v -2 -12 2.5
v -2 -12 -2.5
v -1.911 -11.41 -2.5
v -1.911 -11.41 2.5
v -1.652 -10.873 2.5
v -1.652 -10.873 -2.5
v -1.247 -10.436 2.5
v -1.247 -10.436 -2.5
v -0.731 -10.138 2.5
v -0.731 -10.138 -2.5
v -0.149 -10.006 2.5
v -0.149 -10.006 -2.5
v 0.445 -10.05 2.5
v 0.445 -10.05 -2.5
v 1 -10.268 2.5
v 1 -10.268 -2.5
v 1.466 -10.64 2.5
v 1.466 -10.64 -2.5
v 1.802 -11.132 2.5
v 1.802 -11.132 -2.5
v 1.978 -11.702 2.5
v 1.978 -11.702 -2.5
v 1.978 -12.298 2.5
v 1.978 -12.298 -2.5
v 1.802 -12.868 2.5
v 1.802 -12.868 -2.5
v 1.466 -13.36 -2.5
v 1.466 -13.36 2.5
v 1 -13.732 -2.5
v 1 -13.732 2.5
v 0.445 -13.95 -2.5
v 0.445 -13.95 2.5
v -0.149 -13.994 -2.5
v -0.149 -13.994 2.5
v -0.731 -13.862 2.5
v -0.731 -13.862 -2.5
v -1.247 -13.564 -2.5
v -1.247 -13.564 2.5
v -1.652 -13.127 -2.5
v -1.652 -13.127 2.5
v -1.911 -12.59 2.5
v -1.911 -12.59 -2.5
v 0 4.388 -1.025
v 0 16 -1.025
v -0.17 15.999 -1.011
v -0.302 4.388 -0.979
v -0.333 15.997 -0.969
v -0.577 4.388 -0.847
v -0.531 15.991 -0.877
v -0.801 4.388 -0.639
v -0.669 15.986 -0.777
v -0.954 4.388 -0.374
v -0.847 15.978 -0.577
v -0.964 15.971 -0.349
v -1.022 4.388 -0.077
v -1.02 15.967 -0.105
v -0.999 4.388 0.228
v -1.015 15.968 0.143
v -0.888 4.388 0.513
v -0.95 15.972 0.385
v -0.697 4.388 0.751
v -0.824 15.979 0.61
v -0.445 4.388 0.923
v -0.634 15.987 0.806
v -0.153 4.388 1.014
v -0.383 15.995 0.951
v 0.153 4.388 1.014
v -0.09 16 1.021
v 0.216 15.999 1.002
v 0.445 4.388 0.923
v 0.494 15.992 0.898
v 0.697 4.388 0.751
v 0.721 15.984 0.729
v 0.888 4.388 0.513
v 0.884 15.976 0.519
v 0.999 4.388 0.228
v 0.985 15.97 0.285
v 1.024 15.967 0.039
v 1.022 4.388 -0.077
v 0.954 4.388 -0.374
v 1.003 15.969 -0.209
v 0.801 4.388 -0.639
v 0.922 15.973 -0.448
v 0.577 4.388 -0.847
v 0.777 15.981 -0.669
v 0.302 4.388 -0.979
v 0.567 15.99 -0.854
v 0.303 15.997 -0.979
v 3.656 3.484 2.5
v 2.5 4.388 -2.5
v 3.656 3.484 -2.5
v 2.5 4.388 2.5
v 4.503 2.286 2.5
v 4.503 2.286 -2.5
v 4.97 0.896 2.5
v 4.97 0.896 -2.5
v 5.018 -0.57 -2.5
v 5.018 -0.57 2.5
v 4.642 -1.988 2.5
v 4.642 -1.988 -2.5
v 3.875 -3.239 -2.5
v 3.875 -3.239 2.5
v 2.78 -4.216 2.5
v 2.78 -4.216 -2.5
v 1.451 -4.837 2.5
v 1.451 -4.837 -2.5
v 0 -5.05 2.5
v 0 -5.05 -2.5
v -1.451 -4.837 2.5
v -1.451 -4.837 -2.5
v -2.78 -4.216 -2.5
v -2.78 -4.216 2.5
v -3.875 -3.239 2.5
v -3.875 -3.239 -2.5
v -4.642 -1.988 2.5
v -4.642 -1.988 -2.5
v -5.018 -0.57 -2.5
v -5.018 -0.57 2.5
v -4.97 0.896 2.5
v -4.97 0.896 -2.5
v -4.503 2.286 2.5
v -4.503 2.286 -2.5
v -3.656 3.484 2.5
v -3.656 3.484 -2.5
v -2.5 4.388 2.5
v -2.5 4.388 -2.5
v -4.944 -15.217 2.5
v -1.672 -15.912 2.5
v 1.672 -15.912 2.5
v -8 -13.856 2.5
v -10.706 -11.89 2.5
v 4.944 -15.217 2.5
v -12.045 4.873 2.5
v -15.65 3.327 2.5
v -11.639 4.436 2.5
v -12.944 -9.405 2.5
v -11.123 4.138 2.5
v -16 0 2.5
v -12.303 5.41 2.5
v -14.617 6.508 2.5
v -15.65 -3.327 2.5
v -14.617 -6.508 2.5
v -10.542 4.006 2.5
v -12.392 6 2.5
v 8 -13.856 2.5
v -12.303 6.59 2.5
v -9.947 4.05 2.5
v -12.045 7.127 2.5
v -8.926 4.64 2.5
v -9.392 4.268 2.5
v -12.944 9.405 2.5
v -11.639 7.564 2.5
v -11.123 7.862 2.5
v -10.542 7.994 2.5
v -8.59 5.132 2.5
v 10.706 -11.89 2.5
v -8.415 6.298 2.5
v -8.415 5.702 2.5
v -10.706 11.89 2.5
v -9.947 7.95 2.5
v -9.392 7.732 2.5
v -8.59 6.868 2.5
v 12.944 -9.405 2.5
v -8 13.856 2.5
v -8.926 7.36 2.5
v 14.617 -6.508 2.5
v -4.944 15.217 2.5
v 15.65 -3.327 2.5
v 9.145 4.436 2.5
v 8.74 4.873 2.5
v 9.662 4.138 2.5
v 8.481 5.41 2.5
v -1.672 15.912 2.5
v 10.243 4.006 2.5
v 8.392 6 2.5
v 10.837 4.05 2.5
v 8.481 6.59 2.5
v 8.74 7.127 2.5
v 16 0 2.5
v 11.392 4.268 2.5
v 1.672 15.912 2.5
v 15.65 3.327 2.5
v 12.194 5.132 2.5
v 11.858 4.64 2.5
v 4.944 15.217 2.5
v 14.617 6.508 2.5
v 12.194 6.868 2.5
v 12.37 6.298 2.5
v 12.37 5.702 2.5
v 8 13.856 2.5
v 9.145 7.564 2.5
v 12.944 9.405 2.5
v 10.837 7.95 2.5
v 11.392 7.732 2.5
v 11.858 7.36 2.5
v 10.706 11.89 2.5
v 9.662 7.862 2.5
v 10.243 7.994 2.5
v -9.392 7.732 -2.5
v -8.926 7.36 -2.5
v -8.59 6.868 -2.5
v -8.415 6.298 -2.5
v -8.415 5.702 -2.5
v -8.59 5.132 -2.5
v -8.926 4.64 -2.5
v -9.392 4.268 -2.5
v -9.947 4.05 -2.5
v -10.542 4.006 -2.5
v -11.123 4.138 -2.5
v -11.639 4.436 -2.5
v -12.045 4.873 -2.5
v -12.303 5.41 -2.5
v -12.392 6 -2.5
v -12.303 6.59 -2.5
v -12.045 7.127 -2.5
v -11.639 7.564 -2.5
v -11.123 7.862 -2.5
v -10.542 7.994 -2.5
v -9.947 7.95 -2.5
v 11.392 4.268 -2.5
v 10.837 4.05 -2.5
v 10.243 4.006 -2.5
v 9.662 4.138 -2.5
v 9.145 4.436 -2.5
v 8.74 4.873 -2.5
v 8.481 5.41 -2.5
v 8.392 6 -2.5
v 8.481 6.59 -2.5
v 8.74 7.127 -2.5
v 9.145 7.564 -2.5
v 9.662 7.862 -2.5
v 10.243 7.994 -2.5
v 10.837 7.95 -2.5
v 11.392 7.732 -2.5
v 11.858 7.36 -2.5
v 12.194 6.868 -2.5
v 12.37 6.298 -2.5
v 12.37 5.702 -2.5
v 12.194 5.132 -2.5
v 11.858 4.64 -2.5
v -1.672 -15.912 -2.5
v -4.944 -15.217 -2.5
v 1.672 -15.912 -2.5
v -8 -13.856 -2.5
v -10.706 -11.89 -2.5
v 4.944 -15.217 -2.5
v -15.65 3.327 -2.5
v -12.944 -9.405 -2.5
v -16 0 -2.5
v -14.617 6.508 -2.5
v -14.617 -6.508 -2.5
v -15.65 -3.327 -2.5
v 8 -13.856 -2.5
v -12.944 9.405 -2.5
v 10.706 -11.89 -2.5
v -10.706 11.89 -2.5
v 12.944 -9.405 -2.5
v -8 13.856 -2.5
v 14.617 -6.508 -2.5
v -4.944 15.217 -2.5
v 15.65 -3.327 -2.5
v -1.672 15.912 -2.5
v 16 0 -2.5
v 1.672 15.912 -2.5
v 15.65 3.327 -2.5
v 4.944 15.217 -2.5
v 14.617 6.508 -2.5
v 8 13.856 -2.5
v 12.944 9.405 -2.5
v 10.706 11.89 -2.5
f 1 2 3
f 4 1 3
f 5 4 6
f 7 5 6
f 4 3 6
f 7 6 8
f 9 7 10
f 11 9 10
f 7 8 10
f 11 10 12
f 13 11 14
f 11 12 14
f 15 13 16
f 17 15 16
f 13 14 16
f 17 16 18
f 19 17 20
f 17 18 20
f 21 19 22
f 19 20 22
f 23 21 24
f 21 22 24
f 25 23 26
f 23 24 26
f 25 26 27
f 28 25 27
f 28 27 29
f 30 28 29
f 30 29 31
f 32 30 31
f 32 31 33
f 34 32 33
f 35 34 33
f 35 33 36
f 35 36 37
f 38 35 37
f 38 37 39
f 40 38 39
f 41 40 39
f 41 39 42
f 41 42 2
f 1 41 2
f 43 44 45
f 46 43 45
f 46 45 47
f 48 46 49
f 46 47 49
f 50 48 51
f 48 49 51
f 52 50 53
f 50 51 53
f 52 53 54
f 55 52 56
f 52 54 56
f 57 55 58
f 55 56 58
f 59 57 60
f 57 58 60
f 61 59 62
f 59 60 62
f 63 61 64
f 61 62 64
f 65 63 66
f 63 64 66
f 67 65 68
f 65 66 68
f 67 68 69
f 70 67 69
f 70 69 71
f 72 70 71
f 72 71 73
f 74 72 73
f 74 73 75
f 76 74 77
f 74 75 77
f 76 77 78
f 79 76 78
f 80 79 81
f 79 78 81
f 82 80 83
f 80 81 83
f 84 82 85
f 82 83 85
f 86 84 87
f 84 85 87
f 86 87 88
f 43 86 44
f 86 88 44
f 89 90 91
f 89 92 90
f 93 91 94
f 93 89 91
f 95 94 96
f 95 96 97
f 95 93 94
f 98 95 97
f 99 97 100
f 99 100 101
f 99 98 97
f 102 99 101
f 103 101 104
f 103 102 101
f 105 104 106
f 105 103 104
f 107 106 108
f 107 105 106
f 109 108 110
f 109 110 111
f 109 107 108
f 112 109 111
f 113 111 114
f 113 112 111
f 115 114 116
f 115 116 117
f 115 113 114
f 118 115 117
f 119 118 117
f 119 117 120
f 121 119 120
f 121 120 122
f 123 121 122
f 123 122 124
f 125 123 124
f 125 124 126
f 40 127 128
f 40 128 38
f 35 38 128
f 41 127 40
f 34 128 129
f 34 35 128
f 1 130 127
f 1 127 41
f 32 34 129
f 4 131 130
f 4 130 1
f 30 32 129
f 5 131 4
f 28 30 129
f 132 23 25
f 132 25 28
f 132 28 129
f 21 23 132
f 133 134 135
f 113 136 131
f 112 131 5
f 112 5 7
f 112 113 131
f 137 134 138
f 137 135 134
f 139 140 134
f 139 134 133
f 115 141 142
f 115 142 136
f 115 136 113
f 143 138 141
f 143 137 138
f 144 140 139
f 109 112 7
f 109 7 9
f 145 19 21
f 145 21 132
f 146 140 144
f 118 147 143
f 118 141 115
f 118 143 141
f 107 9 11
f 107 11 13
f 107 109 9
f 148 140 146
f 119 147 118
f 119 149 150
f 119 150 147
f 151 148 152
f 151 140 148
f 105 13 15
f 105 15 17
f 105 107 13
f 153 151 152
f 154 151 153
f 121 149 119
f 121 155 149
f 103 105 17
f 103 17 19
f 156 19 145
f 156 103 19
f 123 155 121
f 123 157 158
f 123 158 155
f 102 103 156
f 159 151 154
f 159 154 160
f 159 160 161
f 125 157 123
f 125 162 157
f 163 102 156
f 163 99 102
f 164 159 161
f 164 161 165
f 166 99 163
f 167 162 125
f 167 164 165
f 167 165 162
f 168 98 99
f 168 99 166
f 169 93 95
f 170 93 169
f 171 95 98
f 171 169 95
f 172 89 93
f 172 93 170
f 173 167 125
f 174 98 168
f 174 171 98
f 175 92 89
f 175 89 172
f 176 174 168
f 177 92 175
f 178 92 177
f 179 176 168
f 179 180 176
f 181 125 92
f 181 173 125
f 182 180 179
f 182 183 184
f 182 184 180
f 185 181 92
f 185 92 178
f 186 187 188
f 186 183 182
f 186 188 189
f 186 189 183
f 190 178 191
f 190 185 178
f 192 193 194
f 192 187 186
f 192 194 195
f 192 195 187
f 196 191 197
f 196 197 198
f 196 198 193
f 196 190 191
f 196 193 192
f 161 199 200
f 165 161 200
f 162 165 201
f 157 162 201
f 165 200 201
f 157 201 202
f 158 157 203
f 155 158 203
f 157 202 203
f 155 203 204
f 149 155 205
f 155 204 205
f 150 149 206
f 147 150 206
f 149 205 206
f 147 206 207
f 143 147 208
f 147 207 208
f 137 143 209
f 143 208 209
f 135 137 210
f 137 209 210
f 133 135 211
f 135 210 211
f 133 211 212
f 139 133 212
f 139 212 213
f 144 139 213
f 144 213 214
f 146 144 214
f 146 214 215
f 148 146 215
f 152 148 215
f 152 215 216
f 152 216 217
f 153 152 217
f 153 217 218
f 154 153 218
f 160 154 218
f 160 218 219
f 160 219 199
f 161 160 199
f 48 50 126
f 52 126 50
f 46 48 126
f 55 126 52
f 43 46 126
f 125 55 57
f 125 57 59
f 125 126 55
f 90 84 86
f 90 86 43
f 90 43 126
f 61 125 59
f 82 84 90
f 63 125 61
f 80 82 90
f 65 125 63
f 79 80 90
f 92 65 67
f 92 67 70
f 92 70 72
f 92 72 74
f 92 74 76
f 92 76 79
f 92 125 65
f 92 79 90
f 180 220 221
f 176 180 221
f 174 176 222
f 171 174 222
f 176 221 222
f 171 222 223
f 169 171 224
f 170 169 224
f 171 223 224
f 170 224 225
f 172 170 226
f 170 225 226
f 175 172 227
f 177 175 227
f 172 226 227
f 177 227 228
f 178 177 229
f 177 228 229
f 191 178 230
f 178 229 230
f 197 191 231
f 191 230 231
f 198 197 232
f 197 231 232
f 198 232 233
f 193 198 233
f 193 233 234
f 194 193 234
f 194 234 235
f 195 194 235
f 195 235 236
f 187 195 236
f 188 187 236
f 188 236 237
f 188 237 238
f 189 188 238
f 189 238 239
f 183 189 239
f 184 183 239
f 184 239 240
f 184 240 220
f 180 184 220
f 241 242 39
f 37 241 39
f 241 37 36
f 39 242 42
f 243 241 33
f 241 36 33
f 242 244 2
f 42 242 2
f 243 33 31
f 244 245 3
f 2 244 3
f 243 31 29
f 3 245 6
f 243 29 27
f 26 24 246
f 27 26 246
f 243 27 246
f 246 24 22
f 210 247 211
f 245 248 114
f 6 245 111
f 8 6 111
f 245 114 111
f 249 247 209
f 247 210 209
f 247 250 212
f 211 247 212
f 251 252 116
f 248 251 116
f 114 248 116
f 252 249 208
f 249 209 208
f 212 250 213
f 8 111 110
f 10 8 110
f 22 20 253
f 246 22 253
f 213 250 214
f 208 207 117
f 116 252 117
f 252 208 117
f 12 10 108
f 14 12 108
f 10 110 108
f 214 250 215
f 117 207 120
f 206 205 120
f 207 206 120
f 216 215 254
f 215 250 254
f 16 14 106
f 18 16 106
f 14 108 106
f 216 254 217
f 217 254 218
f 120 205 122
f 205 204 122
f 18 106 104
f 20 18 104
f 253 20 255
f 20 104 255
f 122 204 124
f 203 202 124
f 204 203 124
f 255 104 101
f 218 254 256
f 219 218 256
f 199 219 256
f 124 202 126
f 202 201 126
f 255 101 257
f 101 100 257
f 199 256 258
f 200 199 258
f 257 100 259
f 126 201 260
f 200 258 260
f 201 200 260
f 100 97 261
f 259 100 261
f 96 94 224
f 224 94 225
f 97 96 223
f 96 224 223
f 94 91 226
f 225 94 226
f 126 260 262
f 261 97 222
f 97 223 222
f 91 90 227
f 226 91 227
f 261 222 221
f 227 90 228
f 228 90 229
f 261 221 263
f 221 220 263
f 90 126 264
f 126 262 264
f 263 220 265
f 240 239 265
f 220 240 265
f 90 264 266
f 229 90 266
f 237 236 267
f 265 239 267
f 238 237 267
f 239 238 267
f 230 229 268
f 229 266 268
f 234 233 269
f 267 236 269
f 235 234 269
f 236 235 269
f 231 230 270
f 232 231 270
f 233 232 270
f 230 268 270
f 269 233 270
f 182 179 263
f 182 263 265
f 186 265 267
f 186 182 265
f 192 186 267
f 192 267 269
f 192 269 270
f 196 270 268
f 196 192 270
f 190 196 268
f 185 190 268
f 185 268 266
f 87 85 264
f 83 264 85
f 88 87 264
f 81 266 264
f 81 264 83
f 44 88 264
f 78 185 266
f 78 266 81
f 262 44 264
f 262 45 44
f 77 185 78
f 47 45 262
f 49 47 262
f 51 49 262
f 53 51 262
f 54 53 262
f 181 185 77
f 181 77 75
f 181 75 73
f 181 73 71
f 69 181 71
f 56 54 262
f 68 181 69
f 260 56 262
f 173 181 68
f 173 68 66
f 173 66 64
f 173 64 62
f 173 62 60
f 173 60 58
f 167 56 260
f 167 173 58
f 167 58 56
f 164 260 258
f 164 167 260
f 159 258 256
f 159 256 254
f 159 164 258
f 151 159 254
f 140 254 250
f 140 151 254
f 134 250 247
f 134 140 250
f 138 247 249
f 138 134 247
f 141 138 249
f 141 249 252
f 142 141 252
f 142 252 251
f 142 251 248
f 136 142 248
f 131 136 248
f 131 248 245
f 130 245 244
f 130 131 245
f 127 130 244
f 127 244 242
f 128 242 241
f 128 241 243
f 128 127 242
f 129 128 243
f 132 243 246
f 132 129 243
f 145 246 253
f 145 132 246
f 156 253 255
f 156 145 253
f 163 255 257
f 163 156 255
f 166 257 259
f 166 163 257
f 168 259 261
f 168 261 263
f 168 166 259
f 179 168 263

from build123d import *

# Parameters (mm, degrees)
SKETCH1_R            = 16
BOSS_EXTRUDE1_DEPTH  = 2.5
M4_CLEARANCE_HOLE2_D = 4
CIRPATTERN1_COUNT    = 3
SKETCH7_W            = 1.025
SKETCH7_H            = 11.612232914


with BuildPart() as part:
    # Sketch1 → Boss-Extrude1 (new body, symmetric)
    with BuildSketch(Plane.XY):
        Circle(SKETCH1_R)
        with BuildLine():
            Line((-2.5, 4.387767086), (2.5, 4.387767086))
            ThreePointArc((2.5, 4.387767086), (0, -5.05), (-2.5, 4.387767086))
        make_face(mode=Mode.SUBTRACT)
    extrude(amount=BOSS_EXTRUDE1_DEPTH, both=True)

    # M4 Clearance Hole2 (through all)
    with Locations(Plane.XY.offset(2.5)):
        with Locations((0, -12)):
            m4_clearance_hole2 = Hole(M4_CLEARANCE_HOLE2_D / 2)

    # CirPattern1: M4 Clearance Hole2 ×3 about axis
    cirpattern1_axis = Axis((0, 0, 0), (0, 0, 1))
    for i in range(1, CIRPATTERN1_COUNT):
        add(m4_clearance_hole2.rotate(cirpattern1_axis, i * 360 / CIRPATTERN1_COUNT), mode=Mode.SUBTRACT)

    # Sketch7 → M2.5x0.45 Tapped Hole1 (revolve, cut)
    with BuildSketch(Plane(origin=(0, 4.387767086, 0), x_dir=(0, 0, -1), z_dir=(1, 0, 0))):
        with Locations((0.5125, 5.806116457)):
            Rectangle(SKETCH7_W, SKETCH7_H)
    revolve(axis=Axis((0, -1.962232914, 0), (0, 1, 0)), mode=Mode.SUBTRACT)


solid = part.part
